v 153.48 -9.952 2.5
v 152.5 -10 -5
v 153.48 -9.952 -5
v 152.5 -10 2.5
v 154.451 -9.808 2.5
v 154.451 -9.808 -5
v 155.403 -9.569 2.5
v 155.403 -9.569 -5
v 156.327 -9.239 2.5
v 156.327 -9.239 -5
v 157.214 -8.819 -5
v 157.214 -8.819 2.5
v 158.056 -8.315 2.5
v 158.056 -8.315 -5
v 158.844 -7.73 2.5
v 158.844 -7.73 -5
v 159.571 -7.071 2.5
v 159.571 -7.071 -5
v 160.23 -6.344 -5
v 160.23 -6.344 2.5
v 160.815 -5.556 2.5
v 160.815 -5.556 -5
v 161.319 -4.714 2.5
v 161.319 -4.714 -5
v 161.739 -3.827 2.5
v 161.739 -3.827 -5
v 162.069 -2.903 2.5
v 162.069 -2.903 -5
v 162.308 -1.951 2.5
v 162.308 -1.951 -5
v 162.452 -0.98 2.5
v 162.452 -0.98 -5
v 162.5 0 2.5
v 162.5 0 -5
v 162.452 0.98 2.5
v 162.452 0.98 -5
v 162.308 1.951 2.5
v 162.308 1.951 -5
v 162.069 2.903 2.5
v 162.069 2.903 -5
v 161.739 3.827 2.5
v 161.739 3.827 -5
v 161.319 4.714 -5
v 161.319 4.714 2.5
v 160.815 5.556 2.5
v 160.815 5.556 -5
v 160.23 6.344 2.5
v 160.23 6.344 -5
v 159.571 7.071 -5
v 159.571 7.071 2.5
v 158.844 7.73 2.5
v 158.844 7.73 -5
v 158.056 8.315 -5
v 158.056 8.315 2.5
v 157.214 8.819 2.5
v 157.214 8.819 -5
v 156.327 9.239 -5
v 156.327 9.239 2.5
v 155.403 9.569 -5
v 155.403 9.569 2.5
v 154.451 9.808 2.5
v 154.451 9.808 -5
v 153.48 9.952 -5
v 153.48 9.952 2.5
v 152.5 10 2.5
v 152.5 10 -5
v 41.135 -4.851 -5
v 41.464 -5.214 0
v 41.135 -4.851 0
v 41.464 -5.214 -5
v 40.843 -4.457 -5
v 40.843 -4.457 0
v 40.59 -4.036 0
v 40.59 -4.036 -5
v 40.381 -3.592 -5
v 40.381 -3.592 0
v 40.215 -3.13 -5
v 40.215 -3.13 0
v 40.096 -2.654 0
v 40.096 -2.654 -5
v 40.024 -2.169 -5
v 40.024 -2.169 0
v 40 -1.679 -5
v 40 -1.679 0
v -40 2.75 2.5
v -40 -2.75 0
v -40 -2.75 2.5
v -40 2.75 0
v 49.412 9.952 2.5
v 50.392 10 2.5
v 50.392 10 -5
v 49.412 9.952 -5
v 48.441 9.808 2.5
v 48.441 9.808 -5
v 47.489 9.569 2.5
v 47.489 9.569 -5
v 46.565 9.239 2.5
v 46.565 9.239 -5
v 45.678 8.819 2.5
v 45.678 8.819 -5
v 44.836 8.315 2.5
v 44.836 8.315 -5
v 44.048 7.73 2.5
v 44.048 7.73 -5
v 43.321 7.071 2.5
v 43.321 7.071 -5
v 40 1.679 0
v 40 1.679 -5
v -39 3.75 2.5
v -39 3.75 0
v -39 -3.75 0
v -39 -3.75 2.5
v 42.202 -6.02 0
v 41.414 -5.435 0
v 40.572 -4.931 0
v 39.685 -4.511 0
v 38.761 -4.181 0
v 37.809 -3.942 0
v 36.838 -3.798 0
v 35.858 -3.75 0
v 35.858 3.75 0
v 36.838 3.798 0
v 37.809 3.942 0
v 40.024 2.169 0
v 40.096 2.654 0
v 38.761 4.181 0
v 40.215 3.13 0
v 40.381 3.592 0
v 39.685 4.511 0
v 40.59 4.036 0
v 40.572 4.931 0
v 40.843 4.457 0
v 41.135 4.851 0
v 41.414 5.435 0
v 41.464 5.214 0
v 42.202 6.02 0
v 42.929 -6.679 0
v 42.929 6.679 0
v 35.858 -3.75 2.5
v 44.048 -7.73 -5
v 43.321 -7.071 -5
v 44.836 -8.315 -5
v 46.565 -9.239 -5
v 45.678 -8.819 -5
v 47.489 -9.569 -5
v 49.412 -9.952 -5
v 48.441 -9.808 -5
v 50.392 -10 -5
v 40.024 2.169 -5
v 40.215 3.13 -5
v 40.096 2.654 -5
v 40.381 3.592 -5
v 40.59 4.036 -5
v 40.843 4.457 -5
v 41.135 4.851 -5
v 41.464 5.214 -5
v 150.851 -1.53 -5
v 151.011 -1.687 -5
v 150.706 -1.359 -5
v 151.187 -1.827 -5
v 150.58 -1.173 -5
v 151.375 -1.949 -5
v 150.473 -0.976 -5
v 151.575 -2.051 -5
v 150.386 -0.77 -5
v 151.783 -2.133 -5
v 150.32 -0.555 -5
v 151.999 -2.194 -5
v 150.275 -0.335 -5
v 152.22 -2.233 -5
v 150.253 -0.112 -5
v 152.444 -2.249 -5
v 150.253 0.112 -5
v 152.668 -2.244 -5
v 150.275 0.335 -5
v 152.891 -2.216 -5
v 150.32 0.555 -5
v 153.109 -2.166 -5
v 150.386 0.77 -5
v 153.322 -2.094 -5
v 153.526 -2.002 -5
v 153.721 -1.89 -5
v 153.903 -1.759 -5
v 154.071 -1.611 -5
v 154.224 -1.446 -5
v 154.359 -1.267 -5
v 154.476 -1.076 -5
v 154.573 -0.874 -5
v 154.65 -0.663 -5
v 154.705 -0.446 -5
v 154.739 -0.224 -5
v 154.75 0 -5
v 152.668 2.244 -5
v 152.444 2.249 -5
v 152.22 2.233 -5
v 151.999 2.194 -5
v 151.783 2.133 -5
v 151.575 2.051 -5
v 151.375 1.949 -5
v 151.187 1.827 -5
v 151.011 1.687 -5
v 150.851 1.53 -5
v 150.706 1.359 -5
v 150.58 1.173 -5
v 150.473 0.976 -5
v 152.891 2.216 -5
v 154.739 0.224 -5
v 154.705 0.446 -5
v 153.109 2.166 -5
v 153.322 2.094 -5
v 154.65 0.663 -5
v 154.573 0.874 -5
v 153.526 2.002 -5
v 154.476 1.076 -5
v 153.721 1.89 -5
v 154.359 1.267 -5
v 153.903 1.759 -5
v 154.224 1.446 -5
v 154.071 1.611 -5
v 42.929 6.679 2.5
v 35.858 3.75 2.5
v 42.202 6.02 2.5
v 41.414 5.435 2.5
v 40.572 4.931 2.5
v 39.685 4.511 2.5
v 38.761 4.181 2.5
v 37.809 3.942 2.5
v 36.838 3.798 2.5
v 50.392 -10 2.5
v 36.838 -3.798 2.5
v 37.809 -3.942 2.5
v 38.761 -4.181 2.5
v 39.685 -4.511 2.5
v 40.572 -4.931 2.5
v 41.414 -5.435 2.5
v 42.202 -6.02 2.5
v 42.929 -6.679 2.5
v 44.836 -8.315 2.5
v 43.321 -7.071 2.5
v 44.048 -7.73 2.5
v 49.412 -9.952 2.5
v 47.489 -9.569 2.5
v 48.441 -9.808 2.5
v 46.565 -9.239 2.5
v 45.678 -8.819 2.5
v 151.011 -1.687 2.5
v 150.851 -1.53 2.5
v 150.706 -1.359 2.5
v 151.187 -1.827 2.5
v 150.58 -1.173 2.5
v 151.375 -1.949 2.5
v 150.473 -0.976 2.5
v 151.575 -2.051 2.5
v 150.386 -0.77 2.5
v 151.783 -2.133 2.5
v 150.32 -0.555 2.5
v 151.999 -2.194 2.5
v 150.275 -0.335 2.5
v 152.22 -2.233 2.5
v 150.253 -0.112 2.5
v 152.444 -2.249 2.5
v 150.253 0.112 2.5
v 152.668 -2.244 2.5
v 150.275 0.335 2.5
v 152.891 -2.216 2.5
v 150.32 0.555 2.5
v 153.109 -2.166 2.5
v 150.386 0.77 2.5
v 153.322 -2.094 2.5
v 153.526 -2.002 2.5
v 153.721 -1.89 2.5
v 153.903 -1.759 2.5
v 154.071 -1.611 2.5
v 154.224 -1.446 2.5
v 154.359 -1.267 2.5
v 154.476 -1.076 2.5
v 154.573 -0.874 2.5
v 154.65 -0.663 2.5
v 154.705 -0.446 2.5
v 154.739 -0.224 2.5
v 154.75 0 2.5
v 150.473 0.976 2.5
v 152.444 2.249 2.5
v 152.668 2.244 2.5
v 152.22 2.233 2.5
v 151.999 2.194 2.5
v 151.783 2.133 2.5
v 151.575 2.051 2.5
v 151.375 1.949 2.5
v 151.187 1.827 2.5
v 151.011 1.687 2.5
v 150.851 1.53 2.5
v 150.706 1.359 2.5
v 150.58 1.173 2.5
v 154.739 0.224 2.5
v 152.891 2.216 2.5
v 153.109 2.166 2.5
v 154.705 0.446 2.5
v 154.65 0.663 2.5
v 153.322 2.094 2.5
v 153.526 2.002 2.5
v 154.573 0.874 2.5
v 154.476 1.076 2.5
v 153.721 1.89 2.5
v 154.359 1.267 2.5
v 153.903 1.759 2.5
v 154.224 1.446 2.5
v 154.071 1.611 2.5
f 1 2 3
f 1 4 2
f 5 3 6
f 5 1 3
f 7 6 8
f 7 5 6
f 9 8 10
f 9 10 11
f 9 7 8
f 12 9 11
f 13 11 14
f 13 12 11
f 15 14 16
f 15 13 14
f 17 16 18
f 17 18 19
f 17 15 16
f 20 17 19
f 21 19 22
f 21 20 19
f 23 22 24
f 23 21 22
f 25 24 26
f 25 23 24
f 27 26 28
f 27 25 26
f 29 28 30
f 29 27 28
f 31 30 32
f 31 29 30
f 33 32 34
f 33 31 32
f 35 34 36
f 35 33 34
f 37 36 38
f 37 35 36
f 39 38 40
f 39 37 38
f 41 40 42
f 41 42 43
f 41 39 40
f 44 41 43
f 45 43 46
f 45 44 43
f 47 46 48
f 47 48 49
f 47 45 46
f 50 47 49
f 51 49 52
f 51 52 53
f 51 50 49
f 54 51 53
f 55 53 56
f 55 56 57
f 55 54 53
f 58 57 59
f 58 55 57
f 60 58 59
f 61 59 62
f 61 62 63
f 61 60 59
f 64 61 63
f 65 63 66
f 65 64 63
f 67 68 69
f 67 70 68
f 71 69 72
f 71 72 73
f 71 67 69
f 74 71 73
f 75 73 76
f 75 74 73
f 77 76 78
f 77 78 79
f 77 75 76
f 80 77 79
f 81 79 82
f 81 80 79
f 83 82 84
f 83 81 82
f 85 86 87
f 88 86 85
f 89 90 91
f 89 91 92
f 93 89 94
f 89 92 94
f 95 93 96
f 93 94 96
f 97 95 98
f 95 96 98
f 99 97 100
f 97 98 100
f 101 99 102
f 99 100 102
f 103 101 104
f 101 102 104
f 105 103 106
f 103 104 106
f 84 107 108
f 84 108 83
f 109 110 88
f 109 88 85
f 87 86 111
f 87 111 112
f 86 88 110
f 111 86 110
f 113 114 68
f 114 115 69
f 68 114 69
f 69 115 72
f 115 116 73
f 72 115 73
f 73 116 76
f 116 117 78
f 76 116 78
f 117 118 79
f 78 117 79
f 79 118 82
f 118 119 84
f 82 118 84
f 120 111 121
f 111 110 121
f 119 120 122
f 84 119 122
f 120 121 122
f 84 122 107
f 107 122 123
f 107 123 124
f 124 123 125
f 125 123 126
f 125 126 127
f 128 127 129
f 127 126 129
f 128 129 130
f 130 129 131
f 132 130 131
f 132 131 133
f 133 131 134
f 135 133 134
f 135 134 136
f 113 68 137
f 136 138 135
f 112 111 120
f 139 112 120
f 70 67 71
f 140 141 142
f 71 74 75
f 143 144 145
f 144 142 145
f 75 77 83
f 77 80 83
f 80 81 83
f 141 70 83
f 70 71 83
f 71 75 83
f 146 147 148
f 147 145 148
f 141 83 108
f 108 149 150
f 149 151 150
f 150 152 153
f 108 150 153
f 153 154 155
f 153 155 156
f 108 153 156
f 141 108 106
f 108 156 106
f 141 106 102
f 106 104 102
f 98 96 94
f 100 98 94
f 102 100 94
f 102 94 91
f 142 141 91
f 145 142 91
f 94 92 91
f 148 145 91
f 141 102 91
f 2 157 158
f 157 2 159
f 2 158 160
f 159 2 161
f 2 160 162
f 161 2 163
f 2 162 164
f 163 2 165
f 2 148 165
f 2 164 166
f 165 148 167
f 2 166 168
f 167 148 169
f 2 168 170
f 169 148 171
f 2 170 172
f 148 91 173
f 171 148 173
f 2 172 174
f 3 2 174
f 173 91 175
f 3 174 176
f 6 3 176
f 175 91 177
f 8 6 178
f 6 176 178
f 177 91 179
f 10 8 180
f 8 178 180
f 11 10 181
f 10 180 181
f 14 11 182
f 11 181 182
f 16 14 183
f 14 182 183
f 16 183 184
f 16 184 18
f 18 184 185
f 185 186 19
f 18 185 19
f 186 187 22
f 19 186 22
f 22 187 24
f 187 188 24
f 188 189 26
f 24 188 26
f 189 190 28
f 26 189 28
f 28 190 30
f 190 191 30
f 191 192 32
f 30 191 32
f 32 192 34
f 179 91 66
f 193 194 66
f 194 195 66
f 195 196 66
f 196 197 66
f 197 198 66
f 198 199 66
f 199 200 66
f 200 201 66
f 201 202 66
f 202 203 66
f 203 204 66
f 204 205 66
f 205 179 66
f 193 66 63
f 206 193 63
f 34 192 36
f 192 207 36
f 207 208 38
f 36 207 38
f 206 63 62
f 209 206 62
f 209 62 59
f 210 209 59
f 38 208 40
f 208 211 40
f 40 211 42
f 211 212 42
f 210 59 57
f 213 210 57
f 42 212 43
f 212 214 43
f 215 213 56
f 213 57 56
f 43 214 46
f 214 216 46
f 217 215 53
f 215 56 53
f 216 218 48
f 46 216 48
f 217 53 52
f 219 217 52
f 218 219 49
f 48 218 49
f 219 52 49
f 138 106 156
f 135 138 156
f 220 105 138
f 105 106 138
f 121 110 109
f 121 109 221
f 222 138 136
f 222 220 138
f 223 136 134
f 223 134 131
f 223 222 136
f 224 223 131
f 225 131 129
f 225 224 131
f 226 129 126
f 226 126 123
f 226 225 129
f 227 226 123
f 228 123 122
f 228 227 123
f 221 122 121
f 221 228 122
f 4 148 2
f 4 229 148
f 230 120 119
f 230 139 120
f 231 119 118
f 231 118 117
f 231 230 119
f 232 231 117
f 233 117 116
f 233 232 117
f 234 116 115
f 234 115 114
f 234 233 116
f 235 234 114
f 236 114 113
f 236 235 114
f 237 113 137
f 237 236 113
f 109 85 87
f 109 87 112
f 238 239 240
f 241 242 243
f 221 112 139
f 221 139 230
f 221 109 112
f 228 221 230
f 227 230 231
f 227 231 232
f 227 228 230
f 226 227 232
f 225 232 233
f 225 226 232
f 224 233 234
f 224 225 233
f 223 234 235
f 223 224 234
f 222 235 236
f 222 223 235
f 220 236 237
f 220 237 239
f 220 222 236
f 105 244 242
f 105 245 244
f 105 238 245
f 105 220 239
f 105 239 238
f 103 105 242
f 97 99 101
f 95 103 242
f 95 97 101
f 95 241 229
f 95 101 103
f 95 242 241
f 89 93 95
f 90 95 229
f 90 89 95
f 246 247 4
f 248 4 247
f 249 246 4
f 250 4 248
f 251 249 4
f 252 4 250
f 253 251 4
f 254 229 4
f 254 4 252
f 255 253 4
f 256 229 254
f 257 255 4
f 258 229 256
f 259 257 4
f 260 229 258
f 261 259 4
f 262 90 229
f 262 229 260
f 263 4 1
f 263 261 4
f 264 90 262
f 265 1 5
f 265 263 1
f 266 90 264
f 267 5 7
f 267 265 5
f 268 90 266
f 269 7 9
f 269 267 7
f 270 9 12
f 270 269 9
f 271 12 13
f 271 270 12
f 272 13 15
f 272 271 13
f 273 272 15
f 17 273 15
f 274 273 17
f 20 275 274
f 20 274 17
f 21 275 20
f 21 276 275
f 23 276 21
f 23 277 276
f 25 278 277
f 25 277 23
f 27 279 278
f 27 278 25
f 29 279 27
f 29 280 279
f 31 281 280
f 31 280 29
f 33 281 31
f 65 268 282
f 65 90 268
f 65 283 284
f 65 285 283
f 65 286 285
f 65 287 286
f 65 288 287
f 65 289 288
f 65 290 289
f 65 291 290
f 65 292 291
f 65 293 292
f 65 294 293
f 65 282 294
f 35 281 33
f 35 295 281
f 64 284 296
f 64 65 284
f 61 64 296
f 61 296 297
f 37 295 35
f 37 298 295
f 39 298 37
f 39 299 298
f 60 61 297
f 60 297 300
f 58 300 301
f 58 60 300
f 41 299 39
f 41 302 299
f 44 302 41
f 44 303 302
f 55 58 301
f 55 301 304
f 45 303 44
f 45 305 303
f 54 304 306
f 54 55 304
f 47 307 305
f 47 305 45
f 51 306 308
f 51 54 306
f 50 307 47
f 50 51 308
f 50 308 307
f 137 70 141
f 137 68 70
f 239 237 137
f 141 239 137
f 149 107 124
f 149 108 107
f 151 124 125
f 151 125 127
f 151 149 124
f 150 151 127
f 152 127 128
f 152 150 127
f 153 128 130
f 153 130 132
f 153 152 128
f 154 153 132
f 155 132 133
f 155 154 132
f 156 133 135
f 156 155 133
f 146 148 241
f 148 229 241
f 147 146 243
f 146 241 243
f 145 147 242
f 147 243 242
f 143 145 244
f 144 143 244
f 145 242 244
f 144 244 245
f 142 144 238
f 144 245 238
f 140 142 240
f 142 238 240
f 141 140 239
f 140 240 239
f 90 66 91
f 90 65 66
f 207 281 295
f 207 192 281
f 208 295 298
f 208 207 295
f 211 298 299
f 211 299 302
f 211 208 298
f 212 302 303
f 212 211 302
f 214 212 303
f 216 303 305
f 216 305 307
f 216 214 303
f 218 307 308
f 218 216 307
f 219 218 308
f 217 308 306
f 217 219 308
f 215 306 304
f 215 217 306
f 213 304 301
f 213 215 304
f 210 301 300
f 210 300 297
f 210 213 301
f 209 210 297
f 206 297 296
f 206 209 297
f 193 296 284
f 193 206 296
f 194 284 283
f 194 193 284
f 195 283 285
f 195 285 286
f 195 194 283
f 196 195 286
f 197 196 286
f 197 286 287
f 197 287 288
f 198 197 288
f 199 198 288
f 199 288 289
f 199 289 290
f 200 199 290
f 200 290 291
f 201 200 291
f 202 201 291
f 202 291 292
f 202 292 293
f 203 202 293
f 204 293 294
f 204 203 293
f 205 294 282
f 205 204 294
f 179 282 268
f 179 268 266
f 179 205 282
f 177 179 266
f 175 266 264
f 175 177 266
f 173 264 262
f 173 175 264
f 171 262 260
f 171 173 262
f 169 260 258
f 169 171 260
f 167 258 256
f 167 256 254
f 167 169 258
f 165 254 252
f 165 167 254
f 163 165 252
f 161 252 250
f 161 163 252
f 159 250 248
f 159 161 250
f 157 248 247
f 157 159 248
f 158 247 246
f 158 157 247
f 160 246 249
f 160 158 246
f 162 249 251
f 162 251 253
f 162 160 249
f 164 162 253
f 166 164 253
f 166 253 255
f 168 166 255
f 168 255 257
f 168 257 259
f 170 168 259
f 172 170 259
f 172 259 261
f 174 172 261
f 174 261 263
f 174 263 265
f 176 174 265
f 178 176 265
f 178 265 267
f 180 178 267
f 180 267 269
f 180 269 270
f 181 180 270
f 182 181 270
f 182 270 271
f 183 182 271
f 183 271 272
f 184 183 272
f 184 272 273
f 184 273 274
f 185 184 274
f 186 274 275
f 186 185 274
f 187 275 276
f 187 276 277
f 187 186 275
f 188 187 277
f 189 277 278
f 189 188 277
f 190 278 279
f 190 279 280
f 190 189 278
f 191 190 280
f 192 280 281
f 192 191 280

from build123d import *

# Parameters (mm, degrees)
F0_W     = 80
F0_H     = 7.5
F0_R     = 2.25
F1_DEPTH = 2.5
F2_DEPTH = 5
F3_SIZE  = 1
F4_R     = 10
F5_R     = 5


with BuildPart() as f1:
    # F0 (on Top) → F1 (new body)
    with BuildSketch(Plane.XY):
        Rectangle(F0_W, F0_H)
        with BuildLine():
            Line((46.25, 10), (40, 3.75))
            Line((40, 3.75), (40, -3.75))
            Line((40, -3.75), (46.25, -10))
            Line((46.25, -10), (152.5, -10))
            ThreePointArc((152.5, -10), (162.5, 0), (152.5, 10))
            Line((152.5, 10), (46.25, 10))
        make_face()
        with Locations((152.5, 0)):
            Circle(F0_R, mode=Mode.SUBTRACT)
    extrude(amount=F1_DEPTH)

    # F0 (on Top) → F2 (join)
    with BuildSketch(Plane.XY):
        with BuildLine():
            Line((46.25, 10), (40, 3.75))
            Line((40, 3.75), (40, -3.75))
            Line((40, -3.75), (46.25, -10))
            Line((46.25, -10), (152.5, -10))
            ThreePointArc((152.5, -10), (162.5, 0), (152.5, 10))
            Line((152.5, 10), (46.25, 10))
        make_face()
        with Locations((152.5, 0)):
            Circle(F0_R, mode=Mode.SUBTRACT)
    extrude(amount=-F2_DEPTH)

    # F3
    f3_edges = [f1.edges().sort_by_distance(p)[0] for p in [
        (-40, -3.75, 1.25),
        (-40, 3.75, 1.25),
    ]]
    chamfer(f3_edges, length=F3_SIZE)

    # F4
    f4_edges = [f1.edges().sort_by_distance(p)[0] for p in [
        (40, -3.75, 1.25),
        (46.25, -10, -1.25),
        (46.25, 10, -1.25),
        (40, 3.75, 1.25),
    ]]
    fillet(f4_edges, radius=F4_R)

    # F5
    f5_edges = [f1.edges().sort_by_distance(p)[0] for p in [
        (40, -3.75, -2.5),
        (40, 3.75, -2.5),
    ]]
    fillet(f5_edges, radius=F5_R)


solid = f1.part
